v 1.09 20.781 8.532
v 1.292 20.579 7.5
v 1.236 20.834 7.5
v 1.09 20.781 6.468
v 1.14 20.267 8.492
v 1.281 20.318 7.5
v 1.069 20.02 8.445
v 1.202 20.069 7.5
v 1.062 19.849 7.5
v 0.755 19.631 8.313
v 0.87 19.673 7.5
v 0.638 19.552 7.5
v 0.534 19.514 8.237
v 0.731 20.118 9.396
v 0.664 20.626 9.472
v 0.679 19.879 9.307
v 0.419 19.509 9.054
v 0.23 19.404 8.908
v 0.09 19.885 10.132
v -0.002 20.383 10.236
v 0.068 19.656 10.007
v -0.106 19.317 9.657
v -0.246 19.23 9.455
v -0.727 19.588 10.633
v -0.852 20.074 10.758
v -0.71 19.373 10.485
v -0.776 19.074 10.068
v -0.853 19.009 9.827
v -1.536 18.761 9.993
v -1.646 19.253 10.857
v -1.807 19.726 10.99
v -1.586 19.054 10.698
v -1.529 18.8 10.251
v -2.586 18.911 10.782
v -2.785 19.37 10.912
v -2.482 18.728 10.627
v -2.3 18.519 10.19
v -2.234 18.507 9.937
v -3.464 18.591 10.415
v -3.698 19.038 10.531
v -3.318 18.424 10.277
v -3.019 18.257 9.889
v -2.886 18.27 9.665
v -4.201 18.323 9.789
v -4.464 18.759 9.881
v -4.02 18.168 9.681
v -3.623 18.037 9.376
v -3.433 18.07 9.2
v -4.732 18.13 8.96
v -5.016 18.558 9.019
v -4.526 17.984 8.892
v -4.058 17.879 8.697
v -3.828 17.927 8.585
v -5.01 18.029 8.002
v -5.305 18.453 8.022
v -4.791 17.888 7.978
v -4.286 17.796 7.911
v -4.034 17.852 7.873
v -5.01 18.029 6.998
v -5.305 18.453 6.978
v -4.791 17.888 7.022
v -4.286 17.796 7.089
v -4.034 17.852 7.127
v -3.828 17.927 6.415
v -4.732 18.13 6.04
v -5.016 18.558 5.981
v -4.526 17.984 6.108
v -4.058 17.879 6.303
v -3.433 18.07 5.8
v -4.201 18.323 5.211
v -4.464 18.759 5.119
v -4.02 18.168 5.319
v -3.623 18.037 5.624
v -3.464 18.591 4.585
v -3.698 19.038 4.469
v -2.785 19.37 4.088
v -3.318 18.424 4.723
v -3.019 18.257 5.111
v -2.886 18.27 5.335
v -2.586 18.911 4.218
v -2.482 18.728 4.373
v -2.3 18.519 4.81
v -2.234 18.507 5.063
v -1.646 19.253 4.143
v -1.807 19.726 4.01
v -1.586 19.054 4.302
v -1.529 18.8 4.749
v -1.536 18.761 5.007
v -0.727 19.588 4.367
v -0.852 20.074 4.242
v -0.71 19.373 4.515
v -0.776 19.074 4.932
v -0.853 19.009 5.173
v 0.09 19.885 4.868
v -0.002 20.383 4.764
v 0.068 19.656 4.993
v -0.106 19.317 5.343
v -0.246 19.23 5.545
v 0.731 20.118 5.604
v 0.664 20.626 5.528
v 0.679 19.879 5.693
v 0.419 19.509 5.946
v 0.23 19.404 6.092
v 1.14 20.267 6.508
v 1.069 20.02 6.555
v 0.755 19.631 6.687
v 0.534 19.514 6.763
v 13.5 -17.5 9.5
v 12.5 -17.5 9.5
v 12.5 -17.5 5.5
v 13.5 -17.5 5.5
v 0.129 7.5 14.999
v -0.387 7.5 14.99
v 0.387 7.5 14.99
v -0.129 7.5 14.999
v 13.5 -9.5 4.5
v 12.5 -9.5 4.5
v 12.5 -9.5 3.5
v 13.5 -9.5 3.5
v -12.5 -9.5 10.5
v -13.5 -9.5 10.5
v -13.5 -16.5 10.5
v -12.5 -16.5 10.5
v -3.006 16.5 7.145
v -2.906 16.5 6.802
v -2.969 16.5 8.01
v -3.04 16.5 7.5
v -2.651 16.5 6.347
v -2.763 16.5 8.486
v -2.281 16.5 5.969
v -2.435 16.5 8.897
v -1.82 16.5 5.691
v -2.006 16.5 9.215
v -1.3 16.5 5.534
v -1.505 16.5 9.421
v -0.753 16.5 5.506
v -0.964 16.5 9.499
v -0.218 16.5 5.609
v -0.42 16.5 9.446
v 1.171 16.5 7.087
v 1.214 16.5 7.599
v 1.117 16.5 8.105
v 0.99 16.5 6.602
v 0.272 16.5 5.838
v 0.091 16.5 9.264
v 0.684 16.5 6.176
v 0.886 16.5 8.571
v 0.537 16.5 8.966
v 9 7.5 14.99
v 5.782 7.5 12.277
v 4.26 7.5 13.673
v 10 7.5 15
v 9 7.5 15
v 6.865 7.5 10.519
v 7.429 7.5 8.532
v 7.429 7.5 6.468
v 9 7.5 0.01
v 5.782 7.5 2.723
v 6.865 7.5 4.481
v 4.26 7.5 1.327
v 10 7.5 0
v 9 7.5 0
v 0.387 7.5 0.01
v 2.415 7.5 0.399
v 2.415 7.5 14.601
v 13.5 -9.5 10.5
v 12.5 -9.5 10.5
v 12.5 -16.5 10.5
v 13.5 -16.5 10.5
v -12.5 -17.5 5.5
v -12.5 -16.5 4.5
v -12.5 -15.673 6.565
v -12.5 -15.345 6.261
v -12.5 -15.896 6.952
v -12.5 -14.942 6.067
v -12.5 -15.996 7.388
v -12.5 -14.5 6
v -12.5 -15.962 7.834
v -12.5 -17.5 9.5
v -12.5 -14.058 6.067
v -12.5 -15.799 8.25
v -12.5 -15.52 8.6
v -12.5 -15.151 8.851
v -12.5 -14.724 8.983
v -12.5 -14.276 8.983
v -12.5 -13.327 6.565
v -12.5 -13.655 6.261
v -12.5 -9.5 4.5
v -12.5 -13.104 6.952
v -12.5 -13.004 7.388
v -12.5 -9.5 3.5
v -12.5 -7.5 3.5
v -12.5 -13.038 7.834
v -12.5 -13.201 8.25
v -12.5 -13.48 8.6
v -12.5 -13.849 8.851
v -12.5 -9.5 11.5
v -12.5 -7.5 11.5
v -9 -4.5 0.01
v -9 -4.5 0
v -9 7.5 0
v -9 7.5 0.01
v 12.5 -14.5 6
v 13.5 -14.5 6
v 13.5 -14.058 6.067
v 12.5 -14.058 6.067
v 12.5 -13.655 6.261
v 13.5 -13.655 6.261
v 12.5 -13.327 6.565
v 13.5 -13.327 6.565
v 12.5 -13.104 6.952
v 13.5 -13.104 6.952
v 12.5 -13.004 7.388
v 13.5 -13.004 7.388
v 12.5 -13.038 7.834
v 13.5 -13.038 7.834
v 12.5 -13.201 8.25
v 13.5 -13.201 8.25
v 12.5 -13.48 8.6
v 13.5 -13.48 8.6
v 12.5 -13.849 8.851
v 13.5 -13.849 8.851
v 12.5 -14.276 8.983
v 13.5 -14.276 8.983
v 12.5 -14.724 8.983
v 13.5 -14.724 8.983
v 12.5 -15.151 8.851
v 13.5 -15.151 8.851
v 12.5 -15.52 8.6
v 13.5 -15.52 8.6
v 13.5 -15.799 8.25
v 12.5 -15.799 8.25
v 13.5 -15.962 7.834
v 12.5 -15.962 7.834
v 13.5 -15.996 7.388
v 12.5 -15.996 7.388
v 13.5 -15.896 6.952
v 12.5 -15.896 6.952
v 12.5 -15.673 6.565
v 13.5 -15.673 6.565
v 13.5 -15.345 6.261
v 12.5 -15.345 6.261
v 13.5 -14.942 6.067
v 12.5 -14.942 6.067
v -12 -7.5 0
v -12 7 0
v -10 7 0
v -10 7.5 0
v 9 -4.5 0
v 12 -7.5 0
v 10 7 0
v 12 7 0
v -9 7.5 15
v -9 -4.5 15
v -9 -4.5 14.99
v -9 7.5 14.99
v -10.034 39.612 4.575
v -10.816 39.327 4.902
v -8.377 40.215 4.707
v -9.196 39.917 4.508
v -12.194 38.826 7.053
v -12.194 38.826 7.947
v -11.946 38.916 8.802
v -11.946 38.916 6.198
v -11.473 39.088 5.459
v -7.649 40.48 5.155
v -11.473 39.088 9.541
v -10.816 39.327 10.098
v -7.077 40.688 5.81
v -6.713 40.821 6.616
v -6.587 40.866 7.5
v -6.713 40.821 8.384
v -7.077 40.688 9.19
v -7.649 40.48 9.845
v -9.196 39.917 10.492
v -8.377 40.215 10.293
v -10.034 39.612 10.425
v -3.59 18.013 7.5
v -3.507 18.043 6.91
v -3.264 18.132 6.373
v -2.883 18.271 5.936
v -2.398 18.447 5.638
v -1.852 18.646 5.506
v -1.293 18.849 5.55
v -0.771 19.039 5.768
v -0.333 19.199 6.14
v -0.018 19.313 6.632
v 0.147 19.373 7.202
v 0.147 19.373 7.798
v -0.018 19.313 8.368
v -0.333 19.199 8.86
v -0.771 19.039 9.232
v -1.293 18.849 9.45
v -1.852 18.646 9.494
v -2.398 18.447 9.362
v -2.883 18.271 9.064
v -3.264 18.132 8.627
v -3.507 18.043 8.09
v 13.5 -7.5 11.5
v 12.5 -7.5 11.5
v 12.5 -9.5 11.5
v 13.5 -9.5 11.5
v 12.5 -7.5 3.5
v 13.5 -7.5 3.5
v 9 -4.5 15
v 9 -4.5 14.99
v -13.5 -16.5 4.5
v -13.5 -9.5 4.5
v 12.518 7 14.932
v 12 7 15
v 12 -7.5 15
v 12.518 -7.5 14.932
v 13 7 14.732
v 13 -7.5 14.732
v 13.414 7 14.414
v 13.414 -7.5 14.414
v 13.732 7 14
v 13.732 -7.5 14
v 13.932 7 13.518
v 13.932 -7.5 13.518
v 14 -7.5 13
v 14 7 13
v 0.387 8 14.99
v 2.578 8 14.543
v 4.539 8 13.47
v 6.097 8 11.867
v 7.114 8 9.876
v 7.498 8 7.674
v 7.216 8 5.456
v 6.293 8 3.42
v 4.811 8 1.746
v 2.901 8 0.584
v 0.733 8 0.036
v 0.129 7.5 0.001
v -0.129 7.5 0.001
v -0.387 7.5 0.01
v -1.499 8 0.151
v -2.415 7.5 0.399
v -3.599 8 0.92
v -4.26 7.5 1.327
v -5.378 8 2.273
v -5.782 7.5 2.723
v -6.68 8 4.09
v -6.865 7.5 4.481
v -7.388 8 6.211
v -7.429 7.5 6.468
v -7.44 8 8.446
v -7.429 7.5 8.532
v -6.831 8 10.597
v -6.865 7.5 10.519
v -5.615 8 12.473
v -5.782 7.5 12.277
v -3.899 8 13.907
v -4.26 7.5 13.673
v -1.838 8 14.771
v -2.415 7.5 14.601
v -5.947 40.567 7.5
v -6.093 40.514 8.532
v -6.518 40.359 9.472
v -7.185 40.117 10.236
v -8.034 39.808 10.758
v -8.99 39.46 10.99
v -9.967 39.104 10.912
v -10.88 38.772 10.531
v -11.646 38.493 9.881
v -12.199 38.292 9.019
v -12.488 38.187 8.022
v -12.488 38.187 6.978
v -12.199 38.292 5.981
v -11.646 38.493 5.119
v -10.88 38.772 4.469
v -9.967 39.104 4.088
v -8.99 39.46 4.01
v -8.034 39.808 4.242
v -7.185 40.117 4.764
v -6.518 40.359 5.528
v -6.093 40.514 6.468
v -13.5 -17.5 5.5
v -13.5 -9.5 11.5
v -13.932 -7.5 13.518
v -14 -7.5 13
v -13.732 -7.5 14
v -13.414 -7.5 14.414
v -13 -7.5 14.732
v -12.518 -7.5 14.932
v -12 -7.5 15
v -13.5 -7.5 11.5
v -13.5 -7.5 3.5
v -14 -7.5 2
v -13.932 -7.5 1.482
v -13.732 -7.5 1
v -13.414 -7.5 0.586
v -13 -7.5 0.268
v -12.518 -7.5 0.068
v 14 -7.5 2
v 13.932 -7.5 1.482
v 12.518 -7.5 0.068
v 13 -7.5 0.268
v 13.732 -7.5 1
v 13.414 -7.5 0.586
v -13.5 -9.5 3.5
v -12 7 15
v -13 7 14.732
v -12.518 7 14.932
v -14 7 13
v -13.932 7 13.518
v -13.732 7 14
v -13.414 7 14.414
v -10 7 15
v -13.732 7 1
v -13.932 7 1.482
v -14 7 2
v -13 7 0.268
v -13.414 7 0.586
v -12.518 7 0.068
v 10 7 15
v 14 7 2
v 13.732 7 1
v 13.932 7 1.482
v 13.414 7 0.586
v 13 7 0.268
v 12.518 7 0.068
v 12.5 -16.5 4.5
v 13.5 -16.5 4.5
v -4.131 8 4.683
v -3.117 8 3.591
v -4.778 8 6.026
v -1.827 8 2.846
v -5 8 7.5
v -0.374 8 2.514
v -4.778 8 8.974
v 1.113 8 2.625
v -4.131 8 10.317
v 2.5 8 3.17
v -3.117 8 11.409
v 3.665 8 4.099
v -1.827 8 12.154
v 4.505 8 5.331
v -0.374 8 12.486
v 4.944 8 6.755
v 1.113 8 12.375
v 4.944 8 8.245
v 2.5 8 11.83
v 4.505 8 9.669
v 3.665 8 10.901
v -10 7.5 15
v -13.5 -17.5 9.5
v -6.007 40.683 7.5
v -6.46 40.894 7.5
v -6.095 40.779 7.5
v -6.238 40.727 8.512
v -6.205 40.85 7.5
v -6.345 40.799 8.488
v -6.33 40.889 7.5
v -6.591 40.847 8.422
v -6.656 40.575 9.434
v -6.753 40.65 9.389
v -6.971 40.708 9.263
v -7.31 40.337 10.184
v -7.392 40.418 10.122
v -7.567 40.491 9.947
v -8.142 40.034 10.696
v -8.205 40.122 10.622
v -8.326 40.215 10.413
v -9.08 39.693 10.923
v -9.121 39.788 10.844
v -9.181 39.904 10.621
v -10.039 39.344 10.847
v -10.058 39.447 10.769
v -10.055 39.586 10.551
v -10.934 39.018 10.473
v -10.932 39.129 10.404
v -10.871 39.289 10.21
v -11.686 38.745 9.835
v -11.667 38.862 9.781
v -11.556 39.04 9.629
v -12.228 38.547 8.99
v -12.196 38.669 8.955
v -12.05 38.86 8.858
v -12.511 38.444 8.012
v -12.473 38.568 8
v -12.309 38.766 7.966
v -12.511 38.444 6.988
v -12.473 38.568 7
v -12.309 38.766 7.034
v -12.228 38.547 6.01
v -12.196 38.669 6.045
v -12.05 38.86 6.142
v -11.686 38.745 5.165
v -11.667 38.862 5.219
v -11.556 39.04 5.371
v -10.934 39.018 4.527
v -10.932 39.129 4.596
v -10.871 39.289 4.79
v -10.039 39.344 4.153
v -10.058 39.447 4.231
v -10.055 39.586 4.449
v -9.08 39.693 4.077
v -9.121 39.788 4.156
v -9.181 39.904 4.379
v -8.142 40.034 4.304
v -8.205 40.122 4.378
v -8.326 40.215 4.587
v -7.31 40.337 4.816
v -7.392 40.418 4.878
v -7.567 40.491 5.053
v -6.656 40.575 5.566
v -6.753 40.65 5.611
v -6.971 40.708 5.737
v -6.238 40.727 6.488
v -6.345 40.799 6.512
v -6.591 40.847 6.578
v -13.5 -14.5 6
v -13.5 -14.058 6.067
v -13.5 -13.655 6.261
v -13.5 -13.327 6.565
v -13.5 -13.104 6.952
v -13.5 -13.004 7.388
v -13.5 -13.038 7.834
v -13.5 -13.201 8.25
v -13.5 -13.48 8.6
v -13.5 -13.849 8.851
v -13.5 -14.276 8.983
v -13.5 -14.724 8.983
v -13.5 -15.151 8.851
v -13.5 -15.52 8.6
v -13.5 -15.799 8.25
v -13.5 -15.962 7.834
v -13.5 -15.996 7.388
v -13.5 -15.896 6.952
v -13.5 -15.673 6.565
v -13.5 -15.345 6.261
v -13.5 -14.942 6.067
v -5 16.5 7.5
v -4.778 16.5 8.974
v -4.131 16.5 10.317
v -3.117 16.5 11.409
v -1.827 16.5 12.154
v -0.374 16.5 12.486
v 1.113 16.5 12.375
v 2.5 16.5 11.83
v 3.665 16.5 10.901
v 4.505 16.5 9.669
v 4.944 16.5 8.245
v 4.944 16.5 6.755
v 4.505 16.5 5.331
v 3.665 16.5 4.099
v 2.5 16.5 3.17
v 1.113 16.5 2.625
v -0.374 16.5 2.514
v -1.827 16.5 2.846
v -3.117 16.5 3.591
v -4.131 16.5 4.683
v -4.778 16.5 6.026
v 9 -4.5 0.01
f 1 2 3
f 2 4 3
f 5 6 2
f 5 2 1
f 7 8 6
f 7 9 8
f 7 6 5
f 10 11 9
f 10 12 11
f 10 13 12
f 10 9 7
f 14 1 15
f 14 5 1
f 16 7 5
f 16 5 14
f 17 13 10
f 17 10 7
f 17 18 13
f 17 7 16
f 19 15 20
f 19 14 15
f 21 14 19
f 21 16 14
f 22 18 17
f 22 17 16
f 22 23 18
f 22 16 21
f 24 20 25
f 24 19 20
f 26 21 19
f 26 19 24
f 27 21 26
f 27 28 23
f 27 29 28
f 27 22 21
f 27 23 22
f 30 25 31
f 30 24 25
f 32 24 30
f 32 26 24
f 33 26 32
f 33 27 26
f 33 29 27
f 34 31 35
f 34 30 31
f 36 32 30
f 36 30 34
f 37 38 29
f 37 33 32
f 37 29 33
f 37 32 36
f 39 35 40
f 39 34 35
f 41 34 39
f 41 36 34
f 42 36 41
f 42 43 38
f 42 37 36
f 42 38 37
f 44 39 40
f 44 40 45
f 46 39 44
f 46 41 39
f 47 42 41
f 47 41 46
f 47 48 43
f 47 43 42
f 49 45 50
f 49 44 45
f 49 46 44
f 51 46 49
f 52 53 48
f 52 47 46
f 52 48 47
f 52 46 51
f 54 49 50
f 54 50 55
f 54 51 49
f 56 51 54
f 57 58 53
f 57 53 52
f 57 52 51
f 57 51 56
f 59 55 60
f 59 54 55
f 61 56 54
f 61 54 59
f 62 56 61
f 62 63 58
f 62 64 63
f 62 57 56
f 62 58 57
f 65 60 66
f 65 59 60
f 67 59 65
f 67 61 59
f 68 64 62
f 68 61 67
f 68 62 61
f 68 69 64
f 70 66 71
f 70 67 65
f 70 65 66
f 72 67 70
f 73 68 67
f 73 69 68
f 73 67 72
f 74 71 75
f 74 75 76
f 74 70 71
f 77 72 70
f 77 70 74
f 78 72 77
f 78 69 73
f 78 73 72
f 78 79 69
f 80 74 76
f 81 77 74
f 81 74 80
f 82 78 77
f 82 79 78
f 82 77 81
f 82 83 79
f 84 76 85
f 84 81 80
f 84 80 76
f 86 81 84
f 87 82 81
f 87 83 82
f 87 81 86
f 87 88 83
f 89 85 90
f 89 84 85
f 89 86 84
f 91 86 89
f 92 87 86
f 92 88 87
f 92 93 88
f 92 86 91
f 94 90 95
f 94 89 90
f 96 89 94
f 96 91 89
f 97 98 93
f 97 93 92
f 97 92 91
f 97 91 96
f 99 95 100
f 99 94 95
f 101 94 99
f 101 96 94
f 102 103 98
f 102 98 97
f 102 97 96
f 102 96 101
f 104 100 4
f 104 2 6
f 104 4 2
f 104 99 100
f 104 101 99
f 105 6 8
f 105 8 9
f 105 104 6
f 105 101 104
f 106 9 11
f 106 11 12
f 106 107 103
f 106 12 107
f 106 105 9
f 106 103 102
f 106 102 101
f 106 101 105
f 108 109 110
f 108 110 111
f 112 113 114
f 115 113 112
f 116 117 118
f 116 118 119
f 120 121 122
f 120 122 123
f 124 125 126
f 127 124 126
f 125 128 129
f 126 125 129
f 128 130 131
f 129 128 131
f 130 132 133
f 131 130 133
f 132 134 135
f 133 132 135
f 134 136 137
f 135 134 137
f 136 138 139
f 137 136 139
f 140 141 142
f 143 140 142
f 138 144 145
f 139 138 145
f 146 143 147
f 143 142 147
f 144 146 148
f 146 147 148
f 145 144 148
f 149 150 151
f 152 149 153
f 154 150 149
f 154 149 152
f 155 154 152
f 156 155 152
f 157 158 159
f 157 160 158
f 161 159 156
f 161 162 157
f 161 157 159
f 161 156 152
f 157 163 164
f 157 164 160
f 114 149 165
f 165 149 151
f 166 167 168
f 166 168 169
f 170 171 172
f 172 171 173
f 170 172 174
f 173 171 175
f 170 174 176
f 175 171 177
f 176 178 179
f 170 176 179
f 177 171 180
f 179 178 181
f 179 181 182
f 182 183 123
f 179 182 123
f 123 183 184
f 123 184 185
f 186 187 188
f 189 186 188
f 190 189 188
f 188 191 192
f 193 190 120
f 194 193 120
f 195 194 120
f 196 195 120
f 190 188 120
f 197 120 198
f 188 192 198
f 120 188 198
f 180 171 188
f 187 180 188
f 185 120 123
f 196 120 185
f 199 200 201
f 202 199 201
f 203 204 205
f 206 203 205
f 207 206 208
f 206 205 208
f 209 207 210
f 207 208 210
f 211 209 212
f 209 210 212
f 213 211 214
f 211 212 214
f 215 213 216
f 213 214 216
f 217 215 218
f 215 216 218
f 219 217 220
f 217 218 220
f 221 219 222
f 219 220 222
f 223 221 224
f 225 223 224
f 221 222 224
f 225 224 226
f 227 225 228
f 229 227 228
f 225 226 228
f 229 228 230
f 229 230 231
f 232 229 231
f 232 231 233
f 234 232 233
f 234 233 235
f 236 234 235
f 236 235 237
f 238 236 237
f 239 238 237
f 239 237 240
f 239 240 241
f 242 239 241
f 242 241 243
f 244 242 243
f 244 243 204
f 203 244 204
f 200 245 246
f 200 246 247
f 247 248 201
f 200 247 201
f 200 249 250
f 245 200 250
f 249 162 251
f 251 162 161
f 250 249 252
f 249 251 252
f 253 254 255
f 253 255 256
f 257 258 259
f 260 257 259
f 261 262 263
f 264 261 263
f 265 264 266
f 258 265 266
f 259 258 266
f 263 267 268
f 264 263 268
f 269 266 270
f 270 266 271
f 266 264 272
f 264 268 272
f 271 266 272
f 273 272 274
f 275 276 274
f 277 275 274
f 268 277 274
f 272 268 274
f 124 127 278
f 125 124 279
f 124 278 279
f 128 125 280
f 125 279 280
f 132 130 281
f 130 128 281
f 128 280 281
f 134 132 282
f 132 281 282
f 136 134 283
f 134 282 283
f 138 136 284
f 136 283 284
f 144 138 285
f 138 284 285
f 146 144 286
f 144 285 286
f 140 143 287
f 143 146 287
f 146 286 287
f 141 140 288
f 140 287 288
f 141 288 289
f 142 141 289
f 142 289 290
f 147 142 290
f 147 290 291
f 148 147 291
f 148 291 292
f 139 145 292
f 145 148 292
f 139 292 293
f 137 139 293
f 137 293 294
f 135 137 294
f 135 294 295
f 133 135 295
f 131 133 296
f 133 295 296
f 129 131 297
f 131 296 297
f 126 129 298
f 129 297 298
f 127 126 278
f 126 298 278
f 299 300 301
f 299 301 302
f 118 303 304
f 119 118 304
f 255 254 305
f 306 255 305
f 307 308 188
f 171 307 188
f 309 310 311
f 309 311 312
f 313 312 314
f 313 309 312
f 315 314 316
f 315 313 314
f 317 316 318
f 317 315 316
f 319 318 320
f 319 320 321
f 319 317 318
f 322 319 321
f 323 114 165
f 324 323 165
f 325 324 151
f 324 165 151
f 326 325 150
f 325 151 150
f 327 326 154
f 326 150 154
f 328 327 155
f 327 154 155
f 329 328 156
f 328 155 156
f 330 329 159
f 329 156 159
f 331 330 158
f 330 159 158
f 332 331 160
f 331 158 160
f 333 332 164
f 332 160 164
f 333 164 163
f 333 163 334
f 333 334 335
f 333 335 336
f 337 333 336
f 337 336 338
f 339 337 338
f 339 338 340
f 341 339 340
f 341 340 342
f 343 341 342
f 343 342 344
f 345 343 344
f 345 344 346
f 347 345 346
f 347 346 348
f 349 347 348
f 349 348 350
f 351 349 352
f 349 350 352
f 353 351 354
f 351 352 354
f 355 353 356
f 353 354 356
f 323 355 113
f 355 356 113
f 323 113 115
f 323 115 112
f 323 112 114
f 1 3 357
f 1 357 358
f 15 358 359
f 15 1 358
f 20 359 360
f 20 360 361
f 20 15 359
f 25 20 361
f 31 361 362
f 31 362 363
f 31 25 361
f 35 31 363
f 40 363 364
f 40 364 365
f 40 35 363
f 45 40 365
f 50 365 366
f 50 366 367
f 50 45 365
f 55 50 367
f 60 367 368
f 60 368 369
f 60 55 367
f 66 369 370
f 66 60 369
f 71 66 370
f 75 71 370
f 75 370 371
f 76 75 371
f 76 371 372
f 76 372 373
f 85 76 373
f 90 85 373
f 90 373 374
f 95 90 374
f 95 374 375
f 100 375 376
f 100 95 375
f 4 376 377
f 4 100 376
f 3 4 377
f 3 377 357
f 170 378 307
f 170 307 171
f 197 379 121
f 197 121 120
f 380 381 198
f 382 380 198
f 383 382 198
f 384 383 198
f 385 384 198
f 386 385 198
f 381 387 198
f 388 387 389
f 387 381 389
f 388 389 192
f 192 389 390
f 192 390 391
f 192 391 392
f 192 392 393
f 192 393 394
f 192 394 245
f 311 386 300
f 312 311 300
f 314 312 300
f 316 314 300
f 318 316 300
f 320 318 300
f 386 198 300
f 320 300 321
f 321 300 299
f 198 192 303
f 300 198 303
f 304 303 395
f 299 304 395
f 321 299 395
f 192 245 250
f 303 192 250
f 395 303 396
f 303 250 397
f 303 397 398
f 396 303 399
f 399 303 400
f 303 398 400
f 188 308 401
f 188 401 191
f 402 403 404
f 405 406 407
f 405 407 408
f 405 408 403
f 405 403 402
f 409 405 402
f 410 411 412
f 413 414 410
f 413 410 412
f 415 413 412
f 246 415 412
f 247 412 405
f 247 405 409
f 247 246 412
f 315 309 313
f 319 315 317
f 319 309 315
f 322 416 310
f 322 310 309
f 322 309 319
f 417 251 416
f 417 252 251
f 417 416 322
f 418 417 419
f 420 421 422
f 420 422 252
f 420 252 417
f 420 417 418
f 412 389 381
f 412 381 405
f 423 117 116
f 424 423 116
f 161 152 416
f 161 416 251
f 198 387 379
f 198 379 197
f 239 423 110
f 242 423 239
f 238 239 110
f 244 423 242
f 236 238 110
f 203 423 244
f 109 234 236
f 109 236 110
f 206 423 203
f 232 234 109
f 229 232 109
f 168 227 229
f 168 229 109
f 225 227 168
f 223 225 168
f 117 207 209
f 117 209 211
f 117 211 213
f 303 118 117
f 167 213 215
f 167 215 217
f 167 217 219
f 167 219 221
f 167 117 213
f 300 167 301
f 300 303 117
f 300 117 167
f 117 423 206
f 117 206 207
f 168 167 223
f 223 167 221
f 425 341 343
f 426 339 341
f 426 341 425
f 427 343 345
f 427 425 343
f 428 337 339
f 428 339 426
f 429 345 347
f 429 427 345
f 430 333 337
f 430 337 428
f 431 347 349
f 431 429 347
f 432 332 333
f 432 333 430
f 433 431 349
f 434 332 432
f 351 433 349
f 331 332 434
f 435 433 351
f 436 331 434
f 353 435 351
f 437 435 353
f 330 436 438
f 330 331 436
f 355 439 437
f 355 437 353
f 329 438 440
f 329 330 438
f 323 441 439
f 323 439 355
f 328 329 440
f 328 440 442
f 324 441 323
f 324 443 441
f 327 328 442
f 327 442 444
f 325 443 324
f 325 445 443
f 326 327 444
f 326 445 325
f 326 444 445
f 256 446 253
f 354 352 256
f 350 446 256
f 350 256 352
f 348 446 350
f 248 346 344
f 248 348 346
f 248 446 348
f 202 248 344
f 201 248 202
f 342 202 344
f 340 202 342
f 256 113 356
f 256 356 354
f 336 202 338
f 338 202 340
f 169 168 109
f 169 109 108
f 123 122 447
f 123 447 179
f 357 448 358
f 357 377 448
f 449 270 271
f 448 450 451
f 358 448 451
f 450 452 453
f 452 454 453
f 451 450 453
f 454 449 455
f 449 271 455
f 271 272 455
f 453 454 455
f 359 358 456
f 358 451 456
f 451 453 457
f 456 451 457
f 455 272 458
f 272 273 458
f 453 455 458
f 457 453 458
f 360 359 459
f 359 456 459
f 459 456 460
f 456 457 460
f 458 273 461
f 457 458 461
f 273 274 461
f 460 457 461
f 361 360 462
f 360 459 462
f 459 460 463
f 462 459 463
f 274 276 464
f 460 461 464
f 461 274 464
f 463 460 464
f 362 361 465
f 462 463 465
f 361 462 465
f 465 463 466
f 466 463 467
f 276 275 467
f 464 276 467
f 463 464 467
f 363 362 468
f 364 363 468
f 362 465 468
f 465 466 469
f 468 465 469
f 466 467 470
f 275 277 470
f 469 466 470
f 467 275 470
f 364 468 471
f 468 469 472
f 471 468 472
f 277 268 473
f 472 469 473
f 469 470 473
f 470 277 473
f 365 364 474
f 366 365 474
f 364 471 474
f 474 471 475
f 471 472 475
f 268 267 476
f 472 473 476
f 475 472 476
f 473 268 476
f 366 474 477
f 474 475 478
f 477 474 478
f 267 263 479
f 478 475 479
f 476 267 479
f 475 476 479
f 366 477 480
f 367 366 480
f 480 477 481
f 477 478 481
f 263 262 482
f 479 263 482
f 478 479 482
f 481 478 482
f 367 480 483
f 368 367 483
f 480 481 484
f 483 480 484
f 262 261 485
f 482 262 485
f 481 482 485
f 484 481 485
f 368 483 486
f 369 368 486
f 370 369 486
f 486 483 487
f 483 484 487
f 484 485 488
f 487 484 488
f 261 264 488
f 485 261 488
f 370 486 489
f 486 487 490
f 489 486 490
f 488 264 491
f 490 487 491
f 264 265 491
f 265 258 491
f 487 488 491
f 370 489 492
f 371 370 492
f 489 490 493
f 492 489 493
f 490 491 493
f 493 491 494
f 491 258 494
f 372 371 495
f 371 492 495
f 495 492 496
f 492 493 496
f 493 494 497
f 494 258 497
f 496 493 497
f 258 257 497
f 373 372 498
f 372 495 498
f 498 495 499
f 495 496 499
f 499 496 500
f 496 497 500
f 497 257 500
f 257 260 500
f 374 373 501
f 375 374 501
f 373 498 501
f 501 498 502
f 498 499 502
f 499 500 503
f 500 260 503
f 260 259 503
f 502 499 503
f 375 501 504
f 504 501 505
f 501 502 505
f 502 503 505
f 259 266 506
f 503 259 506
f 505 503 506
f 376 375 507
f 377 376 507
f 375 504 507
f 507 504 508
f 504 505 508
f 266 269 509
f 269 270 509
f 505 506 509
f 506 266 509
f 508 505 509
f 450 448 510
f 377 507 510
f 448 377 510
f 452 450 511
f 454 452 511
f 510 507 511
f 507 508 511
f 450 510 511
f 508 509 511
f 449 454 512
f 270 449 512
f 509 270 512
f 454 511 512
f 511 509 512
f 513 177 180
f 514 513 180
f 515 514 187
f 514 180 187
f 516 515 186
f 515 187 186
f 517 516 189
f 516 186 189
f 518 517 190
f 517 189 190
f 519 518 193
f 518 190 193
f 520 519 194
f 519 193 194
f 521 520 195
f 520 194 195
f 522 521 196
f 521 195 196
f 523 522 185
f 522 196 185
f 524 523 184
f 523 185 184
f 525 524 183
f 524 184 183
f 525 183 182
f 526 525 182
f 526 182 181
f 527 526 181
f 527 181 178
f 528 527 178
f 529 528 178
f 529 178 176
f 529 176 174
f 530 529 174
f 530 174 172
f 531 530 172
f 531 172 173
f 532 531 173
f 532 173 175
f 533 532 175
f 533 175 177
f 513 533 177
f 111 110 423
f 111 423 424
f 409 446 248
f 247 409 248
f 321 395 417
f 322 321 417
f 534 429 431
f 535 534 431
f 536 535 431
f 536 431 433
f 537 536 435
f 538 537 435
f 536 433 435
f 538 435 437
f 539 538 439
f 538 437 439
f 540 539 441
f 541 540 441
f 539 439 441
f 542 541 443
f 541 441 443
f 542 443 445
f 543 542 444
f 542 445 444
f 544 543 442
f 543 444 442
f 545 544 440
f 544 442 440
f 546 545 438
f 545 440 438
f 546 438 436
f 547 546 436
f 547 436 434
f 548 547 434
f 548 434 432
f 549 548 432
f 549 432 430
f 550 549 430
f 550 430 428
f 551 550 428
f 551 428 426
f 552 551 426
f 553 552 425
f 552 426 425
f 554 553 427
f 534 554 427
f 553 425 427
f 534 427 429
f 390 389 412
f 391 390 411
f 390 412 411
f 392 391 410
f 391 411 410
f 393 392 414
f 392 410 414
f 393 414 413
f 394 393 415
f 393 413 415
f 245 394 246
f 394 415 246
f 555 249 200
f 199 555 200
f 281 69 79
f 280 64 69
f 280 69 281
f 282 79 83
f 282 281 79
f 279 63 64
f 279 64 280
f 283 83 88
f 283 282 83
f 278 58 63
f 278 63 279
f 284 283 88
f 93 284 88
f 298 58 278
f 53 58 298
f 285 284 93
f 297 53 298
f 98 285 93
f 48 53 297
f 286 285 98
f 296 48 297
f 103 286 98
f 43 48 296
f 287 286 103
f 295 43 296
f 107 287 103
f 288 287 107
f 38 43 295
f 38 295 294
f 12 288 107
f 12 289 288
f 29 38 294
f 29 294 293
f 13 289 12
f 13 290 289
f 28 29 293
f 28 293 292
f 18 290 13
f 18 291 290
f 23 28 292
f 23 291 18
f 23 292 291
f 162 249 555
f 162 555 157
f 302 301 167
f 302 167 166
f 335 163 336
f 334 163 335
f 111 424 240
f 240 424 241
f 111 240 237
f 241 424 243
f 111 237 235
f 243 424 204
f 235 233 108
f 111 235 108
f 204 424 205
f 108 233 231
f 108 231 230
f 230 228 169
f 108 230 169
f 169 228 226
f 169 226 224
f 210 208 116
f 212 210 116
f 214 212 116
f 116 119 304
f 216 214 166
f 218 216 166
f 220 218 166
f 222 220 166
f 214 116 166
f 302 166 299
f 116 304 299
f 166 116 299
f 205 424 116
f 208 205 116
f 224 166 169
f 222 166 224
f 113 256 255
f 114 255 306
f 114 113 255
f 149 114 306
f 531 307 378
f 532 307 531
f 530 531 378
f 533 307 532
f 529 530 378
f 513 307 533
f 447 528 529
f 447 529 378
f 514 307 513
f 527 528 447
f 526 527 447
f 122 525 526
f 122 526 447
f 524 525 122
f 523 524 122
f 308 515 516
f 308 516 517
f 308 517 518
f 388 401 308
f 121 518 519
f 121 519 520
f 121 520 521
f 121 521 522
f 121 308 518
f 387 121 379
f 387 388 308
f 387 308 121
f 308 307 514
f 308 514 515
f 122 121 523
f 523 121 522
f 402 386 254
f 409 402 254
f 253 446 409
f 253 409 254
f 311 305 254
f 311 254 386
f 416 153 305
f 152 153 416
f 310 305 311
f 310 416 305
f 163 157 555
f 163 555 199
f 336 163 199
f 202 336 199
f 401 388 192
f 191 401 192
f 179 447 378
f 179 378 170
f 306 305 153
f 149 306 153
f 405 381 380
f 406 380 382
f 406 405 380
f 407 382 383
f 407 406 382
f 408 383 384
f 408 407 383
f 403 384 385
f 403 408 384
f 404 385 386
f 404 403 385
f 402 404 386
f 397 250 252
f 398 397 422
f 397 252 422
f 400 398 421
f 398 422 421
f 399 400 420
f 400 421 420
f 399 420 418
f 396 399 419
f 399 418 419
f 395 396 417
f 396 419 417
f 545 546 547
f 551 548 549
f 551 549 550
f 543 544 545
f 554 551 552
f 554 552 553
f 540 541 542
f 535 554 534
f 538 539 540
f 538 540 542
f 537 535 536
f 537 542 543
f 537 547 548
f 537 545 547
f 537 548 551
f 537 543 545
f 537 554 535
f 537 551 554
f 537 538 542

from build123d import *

# Parameters (mm, degrees)
SKETCH_1_W          = 28
SKETCH_1_H          = 15
EXTRUDE_1_DEPTH     = 15
SKETCH_2_W          = 1
SKETCH_2_H          = 8
EXTRUDE_2_DEPTH     = 2
SKETCH_3_W          = 1
SKETCH_3_H          = 6
EXTRUDE_3_DEPTH     = 8
SKETCH_4_W          = 1
SKETCH_4_H          = 6
EXTRUDE_4_DEPTH     = 8
FILLET_1_R          = 2
CHAMFER_1_SIZE      = 1
SKETCH_5_R          = 1.5
CUT_EXTRUDE_1_DEPTH = 36.881750236
SKETCH_6_W          = 4
SKETCH_6_H          = 15
CUT_EXTRUDE_2_DEPTH = 0.5
SKETCH_7_W          = 18
SKETCH_7_H          = 12
CUT_EXTRUDE_3_DEPTH = 0.01
SKETCH_8_W          = 18
SKETCH_8_H          = 12
CUT_EXTRUDE_4_DEPTH = 0.01
SKETCH_9_R          = 7.5
EXTRUDE_5_DEPTH     = 0.5
SKETCH_10_R         = 5
EXTRUDE_6_DEPTH     = 8.5
EXTRUDE_7_REACH     = 44.753
SKETCH_22_R         = 2
SKETCH_23_R         = 3.5
EXTRUDE_8_DEPTH     = 22.5
FILLET_2_R          = 1
FILLET_3_R          = 0.5


with BuildPart() as part:
    # ｽｹｯﾁ1 → ﾎﾞｽ - 押し出し1 (new body)
    with BuildSketch(Plane.XY):
        Rectangle(SKETCH_1_W, SKETCH_1_H)
    extrude(amount=EXTRUDE_1_DEPTH)

    # ｽｹｯﾁ2 → ﾎﾞｽ - 押し出し2 (add)
    with BuildSketch(Plane.XZ.offset(7.5)):
        with Locations((-13, 7.5)):
            Rectangle(SKETCH_2_W, SKETCH_2_H)
        with Locations((13, 7.5)):
            Rectangle(SKETCH_2_W, SKETCH_2_H)
    extrude(amount=EXTRUDE_2_DEPTH)

    # ｽｹｯﾁ3 → ﾎﾞｽ - 押し出し3 (add)
    with BuildSketch(Plane.XZ.offset(9.5)):
        with Locations((-13, 7.5)):
            Rectangle(SKETCH_3_W, SKETCH_3_H)
    extrude(amount=EXTRUDE_3_DEPTH)

    # ｽｹｯﾁ4 → ﾎﾞｽ - 押し出し4 (add)
    with BuildSketch(Plane.XZ.offset(9.5)):
        with Locations((13, 7.5)):
            Rectangle(SKETCH_4_W, SKETCH_4_H)
    extrude(amount=EXTRUDE_4_DEPTH)

    # ﾌｨﾚｯﾄ1
    fillet_1_edges = [part.edges().sort_by_distance(p)[0] for p in [
        (14, 0, 15),
        (-14, 0, 15),
        (14, 0, 0),
        (-14, 0, 0),
    ]]
    fillet(fillet_1_edges, radius=FILLET_1_R)

    # 面取り1
    chamfer_1_edges = [part.edges().sort_by_distance(p)[0] for p in [
        (-13, -17.5, 4.5),
        (-13, -17.5, 10.5),
        (13, -17.5, 4.5),
        (13, -17.5, 10.5),
    ]]
    chamfer(chamfer_1_edges, length=CHAMFER_1_SIZE)

    # ｽｹｯﾁ5 → ｶｯﾄ - 押し出し1 (cut, through all)
    with BuildSketch(Plane(origin=(13.5, 0, 0), x_dir=(0, 0, -1), z_dir=(1, 0, 0))):
        with Locations((-7.5, -14.5)):
            Circle(SKETCH_5_R)
    extrude(amount=-CUT_EXTRUDE_1_DEPTH, mode=Mode.SUBTRACT)

    # ｽｹｯﾁ6 → ｶｯﾄ - 押し出し2 (cut)
    with BuildSketch(Plane(origin=(0, 7.5, 0), x_dir=(1, 0, 0), z_dir=(0, 1, 0))):
        with Locations((-12, -7.5)):
            Rectangle(SKETCH_6_W, SKETCH_6_H)
        with Locations((12, -7.5)):
            Rectangle(SKETCH_6_W, SKETCH_6_H)
    extrude(amount=-CUT_EXTRUDE_2_DEPTH, mode=Mode.SUBTRACT)

    # ｽｹｯﾁ7 → ｶｯﾄ - 押し出し3 (cut)
    with BuildSketch(Plane.XY.offset(15)):
        with Locations((0, 1.5)):
            Rectangle(SKETCH_7_W, SKETCH_7_H)
    extrude(amount=-CUT_EXTRUDE_3_DEPTH, mode=Mode.SUBTRACT)

    # ｽｹｯﾁ8 → ｶｯﾄ - 押し出し4 (cut)
    with BuildSketch(Plane(origin=(0, 0, 0), x_dir=(-1, 0, 0), z_dir=(0, 0, -1))):
        with Locations((0, 1.5)):
            Rectangle(SKETCH_8_W, SKETCH_8_H)
    extrude(amount=-CUT_EXTRUDE_4_DEPTH, mode=Mode.SUBTRACT)

    # ｽｹｯﾁ9 → ﾎﾞｽ - 押し出し5 (add)
    with BuildSketch(Plane(origin=(0, 7.5, 0), x_dir=(1, 0, 0), z_dir=(0, 1, 0))):
        with Locations(Location((0, -7.5, 0), (0, 0, 272.959070179))):
            Circle(SKETCH_9_R)
    extrude(amount=EXTRUDE_5_DEPTH)

    # ｽｹｯﾁ10 → ﾎﾞｽ - 押し出し6 (add)
    with BuildSketch(Plane(origin=(0, 8, 0), x_dir=(1, 0, 0), z_dir=(0, 1, 0))):
        with Locations(Location((0, -7.5, 0), (0, 0, 180))):
            Circle(SKETCH_10_R)
    extrude(amount=EXTRUDE_6_DEPTH)


with BuildPart() as body_2:
    # ﾎﾞｽ - 押し出し7: up to this plane
    extrude_7_end = Plane(origin=(0, 16.5, 7.5), z_dir=(0, 1, 0))
    # ｽｹｯﾁ22 → ﾎﾞｽ - 押し出し7 (new, up to the surface)
    with BuildSketch(Plane(origin=(-6.209280477, 17.059857902, 0), x_dir=(-0.9396926207859082, -0.3420201433256695, 0), z_dir=(0.3420201433256695, -0.9396926207859082, 0)), mode=Mode.PRIVATE) as extrude_7_sk1:
        with Locations((-4.786889404, -7.5)):
            Circle(SKETCH_22_R)
    extrude_7_tool1 = split(extrude(extrude_7_sk1.sketch, amount=EXTRUDE_7_REACH, mode=Mode.PRIVATE), bisect_by=extrude_7_end, keep=Keep.BOTH, mode=Mode.PRIVATE)
    add(extrude_7_tool1.solids().sort_by_distance((-1.711076, 18.697071, 7.5))[0])

    # ｽｹｯﾁ23 → ﾎﾞｽ - 押し出し8 (add)
    with BuildSketch(Plane(origin=(-6.209280477, 17.059857902, 0), x_dir=(-0.9396926207859082, -0.3420201433256695, 0), z_dir=(0.3420201433256695, -0.9396926207859082, 0))):
        with Locations(Location((-4.786889404, -7.5, 0), (0, 0, 180))):
            Circle(SKETCH_23_R)
    extrude(amount=-EXTRUDE_8_DEPTH)

    # ﾌｨﾚｯﾄ2
    fillet_2_edges = [body_2.edges().sort_by_distance(p)[0] for p in [
        (-5, 17.5, 7.5),
    ]]
    fillet(fillet_2_edges, radius=FILLET_2_R)

    # ﾌｨﾚｯﾄ3
    fillet_3_edges = [body_2.edges().sort_by_distance(p)[0] for p in [
        (-12.695453225, 38.643083968, 7.5),
    ]]
    fillet(fillet_3_edges, radius=FILLET_3_R)


solid = Compound([part.part, body_2.part])
